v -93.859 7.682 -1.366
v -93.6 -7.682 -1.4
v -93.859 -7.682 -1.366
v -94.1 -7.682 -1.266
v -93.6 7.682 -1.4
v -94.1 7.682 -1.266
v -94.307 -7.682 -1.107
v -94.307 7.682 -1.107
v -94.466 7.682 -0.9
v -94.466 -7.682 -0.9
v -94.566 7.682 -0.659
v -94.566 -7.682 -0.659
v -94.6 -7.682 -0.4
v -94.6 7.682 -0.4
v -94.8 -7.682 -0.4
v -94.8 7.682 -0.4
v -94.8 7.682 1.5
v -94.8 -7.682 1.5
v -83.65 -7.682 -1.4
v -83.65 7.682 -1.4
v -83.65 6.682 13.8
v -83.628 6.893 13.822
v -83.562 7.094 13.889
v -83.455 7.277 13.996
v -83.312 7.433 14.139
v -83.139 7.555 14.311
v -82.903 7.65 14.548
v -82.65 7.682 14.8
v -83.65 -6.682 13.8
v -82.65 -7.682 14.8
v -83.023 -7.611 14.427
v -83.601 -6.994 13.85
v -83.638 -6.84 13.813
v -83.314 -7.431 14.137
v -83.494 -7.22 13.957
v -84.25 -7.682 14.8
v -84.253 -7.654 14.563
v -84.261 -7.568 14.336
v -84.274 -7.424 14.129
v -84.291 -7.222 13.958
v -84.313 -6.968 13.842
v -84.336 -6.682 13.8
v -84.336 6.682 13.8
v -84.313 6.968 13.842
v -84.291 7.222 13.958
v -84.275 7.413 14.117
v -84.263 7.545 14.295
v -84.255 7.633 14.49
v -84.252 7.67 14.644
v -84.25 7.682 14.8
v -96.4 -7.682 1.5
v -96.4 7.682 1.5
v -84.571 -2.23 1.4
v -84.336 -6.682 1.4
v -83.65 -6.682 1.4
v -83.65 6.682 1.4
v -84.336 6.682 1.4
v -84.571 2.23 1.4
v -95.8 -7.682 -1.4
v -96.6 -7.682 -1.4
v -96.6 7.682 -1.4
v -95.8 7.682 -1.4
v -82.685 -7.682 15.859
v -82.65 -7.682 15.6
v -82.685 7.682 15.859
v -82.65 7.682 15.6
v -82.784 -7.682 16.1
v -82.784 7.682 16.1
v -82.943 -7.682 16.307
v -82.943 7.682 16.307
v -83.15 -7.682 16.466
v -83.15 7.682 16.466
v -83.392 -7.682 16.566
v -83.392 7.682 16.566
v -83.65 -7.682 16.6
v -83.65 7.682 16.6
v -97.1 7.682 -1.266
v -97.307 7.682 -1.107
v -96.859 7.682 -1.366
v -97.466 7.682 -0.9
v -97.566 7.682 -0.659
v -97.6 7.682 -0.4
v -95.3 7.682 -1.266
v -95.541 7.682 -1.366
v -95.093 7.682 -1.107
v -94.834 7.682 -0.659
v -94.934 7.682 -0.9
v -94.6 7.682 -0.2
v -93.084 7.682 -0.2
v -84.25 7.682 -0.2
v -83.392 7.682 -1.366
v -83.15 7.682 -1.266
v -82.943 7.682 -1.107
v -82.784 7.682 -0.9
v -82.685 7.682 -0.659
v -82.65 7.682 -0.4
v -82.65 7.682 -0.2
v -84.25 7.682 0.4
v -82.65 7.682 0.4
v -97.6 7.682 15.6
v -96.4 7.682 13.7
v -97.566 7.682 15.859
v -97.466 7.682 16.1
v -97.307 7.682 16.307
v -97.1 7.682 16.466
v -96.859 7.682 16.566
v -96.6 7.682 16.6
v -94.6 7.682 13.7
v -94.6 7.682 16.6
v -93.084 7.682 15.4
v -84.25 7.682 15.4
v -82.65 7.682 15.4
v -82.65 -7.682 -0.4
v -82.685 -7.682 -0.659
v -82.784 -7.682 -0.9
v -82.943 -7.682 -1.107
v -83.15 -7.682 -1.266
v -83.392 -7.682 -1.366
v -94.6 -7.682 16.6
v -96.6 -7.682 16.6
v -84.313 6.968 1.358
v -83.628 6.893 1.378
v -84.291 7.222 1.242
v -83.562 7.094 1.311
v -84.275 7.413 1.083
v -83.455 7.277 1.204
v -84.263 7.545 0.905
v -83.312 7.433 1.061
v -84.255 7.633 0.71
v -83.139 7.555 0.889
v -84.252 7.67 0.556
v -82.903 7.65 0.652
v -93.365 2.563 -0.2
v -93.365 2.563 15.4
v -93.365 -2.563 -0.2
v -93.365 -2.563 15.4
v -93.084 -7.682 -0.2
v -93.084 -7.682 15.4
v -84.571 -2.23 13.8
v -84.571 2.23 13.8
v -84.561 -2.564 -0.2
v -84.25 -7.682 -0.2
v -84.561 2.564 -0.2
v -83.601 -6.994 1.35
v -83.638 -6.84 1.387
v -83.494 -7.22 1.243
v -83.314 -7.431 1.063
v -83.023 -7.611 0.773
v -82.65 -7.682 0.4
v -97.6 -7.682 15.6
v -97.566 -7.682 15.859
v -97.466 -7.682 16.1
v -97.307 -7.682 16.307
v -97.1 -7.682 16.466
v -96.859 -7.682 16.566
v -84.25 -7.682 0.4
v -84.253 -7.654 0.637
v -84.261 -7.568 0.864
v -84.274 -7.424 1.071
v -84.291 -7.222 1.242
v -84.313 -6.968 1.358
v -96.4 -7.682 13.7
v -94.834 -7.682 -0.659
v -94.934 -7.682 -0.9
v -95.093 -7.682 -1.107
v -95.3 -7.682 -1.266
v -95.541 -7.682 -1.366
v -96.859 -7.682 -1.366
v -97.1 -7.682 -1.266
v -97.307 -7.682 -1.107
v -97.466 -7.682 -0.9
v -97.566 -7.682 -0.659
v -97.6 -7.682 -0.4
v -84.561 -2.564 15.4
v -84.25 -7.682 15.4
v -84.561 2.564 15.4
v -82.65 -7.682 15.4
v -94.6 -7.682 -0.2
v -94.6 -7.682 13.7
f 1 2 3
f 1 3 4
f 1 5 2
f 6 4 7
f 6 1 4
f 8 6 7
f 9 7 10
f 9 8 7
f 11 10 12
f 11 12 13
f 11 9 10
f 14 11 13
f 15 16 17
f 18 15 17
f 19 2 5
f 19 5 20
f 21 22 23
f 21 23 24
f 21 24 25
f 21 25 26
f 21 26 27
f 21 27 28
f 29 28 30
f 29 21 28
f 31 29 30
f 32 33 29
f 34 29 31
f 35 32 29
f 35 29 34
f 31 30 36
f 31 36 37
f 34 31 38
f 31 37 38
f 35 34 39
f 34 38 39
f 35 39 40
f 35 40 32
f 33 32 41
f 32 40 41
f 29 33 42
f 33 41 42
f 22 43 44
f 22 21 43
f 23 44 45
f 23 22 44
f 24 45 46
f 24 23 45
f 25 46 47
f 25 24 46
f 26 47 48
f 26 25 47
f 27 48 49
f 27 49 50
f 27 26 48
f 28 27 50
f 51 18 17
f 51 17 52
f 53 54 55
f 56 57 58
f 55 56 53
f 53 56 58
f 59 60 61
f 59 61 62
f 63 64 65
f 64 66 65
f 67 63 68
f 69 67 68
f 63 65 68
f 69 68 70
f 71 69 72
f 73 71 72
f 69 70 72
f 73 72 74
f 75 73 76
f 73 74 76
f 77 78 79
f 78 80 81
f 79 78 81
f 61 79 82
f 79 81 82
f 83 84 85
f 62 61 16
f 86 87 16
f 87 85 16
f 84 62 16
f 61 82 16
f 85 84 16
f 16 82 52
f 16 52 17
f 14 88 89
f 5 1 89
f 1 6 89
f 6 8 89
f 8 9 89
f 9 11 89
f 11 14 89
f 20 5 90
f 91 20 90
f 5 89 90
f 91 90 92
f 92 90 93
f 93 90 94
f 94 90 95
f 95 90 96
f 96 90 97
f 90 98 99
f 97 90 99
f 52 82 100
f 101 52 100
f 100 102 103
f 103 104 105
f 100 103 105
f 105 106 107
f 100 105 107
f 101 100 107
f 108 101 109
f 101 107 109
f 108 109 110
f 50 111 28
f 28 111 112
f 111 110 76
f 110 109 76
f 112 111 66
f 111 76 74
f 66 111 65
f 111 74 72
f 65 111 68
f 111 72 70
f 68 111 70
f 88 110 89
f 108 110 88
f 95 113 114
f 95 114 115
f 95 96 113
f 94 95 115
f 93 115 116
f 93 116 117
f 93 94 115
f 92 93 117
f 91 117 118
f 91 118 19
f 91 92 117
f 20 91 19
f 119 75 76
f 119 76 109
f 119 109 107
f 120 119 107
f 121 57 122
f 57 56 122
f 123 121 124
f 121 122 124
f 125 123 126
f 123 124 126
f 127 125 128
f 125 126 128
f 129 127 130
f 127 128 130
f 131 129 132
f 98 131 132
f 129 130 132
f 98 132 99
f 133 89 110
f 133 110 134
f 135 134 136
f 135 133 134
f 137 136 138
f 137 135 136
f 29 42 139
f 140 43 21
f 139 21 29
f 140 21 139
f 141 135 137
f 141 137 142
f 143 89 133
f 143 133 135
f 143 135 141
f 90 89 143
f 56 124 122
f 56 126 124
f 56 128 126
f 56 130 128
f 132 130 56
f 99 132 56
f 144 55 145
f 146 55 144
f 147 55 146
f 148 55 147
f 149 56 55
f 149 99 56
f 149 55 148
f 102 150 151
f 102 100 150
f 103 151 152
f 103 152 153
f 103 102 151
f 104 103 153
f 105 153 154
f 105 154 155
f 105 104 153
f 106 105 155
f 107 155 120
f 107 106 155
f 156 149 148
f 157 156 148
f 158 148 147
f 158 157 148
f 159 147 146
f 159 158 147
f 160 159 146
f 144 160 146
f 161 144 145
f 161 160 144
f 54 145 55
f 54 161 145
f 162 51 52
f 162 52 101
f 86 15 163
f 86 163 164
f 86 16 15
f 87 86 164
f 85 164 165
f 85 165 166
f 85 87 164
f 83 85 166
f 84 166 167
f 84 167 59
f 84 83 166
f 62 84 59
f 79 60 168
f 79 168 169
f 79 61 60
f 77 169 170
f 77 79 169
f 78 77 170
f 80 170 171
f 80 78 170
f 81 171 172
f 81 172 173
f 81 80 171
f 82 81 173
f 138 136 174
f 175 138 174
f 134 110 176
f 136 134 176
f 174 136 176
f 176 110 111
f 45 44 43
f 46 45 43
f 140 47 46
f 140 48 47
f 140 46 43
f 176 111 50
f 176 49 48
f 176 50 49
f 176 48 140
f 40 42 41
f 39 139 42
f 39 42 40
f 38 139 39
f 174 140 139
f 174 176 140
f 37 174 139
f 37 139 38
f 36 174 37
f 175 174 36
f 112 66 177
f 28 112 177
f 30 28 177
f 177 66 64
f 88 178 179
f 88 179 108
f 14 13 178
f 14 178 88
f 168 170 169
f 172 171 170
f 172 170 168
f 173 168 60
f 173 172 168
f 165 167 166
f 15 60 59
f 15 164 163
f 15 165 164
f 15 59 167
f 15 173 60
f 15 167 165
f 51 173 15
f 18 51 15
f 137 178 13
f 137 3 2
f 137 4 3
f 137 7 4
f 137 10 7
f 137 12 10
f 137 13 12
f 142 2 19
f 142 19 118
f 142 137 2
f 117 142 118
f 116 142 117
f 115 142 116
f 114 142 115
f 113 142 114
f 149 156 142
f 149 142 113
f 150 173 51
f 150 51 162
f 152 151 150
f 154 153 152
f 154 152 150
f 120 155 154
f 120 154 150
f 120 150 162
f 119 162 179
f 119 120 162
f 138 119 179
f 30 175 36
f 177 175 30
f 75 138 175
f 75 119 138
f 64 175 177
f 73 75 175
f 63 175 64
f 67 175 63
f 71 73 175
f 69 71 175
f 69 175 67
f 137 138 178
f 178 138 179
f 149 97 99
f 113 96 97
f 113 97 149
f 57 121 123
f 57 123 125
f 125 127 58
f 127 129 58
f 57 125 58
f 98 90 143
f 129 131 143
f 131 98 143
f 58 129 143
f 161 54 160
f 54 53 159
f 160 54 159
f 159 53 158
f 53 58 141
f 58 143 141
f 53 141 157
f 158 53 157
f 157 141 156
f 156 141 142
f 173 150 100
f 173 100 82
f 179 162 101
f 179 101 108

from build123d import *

# Parameters (mm, degrees)
SKETCH032_W     = 11.9495428665
SKETCH032_H     = 15.3649565959
PAD021_DEPTH    = 1.2
PAD022_DEPTH    = 15.6
SKETCH034_W     = 11.9495428665
SKETCH034_H     = 15.3649565959
PAD023_DEPTH    = 1.2
PAD024_DEPTH    = 1.6
PAD025_DEPTH    = 1.6
PAD026_DEPTH    = 15.3649565959
CHAMFER009_SIZE = 1
FILLET003_R     = 1


with BuildPart() as part:
    # Sketch032 → Pad021 (new body)
    with BuildSketch(Plane.XY):
        with Locations((-88.6252285667, 0)):
            Rectangle(SKETCH032_W, SKETCH032_H)
    extrude(amount=PAD021_DEPTH)

    # Sketch033 → Pad022 (join)
    with BuildSketch(Plane.XY.offset(1.2)):
        with BuildLine():
            ThreePointArc((-93.0835083525, 7.682478298), (-93.4, 0), (-93.0835083525, -7.682478298))
            Line((-94.6, -7.682478298), (-93.0835083525, -7.682478298))
            Line((-94.6, 7.682478298), (-94.6, -7.682478298))
            Line((-93.0835083525, 7.682478298), (-94.6, 7.682478298))
        make_face()
    extrude(amount=PAD022_DEPTH)

    # Sketch034 → Pad023 (join)
    with BuildSketch(Plane.XY.offset(16.8)):
        with Locations((-88.6252285667, 0)):
            Rectangle(SKETCH034_W, SKETCH034_H)
    extrude(amount=PAD023_DEPTH)

    # Sketch035 → Pad024 (join)
    with BuildSketch(Plane.XY.offset(1.2)):
        with BuildLine():
            ThreePointArc((-84.2504571335, 7.682478298), (-84.6, 0), (-84.2504571335, -7.682478298))
            Line((-82.6504571335, -7.682478298), (-84.2504571335, -7.682478298))
            Line((-82.6504571335, 7.682478298), (-82.6504571335, -7.682478298))
            Line((-84.2504571335, 7.682478298), (-82.6504571335, 7.682478298))
        make_face()
    extrude(amount=PAD024_DEPTH)

    # Sketch036 → Pad025 (join)
    with BuildSketch(Plane.XY.offset(16.8)):
        with BuildLine():
            ThreePointArc((-84.2504571335, 7.682478298), (-84.6, 0), (-84.2504571335, -7.682478298))
            Line((-82.6504571335, -7.682478298), (-84.2504571335, -7.682478298))
            Line((-82.6504571335, 7.682478298), (-82.6504571335, -7.682478298))
            Line((-84.2504571335, 7.682478298), (-82.6504571335, 7.682478298))
        make_face()
    extrude(amount=-PAD025_DEPTH)

    # Sketch031 (on Plane of DatumPlane) → Pad026 (join)
    with BuildSketch(Plane(origin=(-94.6, -7.682478298, 0), x_dir=(-1, 0, 0), z_dir=(0, 1, 0))):
        Polygon((0, 15.1), (0, 18), (3, 18), (3, 0), (0.2, 0), (0.2, 2.9), (1.8, 2.9), (1.8, 15.1), align=None)
    extrude(amount=PAD026_DEPTH)

    # Chamfer009
    chamfer009_edges = [part.edges().sort_by_distance(p)[0] for p in [
        (-82.650457, 0, 15.2),
        (-82.650457, 0, 2.8),
    ]]
    chamfer(chamfer009_edges, length=CHAMFER009_SIZE)

    # Fillet003
    fillet003_edges = [part.edges().sort_by_distance(p)[0] for p in [
        (-97.6, 0, 0),
        (-97.6, 0, 18),
        (-94.8, 0, 0),
        (-94.6, 0, 0),
        (-82.650457, 0, 0),
        (-83.950457, 7.682478, 2.8),
        (-83.950457, 7.682478, 15.2),
        (-83.950457, -7.682478, 2.8),
        (-83.950457, -7.682478, 15.2),
        (-82.650457, 0, 18),
    ]]
    fillet(fillet003_edges, radius=FILLET003_R)


with BuildPart() as part_1:
    # Body008 placement: moved
    add(part.part.moved(Location((0, 0, -1.4))))


solid = part_1.part
